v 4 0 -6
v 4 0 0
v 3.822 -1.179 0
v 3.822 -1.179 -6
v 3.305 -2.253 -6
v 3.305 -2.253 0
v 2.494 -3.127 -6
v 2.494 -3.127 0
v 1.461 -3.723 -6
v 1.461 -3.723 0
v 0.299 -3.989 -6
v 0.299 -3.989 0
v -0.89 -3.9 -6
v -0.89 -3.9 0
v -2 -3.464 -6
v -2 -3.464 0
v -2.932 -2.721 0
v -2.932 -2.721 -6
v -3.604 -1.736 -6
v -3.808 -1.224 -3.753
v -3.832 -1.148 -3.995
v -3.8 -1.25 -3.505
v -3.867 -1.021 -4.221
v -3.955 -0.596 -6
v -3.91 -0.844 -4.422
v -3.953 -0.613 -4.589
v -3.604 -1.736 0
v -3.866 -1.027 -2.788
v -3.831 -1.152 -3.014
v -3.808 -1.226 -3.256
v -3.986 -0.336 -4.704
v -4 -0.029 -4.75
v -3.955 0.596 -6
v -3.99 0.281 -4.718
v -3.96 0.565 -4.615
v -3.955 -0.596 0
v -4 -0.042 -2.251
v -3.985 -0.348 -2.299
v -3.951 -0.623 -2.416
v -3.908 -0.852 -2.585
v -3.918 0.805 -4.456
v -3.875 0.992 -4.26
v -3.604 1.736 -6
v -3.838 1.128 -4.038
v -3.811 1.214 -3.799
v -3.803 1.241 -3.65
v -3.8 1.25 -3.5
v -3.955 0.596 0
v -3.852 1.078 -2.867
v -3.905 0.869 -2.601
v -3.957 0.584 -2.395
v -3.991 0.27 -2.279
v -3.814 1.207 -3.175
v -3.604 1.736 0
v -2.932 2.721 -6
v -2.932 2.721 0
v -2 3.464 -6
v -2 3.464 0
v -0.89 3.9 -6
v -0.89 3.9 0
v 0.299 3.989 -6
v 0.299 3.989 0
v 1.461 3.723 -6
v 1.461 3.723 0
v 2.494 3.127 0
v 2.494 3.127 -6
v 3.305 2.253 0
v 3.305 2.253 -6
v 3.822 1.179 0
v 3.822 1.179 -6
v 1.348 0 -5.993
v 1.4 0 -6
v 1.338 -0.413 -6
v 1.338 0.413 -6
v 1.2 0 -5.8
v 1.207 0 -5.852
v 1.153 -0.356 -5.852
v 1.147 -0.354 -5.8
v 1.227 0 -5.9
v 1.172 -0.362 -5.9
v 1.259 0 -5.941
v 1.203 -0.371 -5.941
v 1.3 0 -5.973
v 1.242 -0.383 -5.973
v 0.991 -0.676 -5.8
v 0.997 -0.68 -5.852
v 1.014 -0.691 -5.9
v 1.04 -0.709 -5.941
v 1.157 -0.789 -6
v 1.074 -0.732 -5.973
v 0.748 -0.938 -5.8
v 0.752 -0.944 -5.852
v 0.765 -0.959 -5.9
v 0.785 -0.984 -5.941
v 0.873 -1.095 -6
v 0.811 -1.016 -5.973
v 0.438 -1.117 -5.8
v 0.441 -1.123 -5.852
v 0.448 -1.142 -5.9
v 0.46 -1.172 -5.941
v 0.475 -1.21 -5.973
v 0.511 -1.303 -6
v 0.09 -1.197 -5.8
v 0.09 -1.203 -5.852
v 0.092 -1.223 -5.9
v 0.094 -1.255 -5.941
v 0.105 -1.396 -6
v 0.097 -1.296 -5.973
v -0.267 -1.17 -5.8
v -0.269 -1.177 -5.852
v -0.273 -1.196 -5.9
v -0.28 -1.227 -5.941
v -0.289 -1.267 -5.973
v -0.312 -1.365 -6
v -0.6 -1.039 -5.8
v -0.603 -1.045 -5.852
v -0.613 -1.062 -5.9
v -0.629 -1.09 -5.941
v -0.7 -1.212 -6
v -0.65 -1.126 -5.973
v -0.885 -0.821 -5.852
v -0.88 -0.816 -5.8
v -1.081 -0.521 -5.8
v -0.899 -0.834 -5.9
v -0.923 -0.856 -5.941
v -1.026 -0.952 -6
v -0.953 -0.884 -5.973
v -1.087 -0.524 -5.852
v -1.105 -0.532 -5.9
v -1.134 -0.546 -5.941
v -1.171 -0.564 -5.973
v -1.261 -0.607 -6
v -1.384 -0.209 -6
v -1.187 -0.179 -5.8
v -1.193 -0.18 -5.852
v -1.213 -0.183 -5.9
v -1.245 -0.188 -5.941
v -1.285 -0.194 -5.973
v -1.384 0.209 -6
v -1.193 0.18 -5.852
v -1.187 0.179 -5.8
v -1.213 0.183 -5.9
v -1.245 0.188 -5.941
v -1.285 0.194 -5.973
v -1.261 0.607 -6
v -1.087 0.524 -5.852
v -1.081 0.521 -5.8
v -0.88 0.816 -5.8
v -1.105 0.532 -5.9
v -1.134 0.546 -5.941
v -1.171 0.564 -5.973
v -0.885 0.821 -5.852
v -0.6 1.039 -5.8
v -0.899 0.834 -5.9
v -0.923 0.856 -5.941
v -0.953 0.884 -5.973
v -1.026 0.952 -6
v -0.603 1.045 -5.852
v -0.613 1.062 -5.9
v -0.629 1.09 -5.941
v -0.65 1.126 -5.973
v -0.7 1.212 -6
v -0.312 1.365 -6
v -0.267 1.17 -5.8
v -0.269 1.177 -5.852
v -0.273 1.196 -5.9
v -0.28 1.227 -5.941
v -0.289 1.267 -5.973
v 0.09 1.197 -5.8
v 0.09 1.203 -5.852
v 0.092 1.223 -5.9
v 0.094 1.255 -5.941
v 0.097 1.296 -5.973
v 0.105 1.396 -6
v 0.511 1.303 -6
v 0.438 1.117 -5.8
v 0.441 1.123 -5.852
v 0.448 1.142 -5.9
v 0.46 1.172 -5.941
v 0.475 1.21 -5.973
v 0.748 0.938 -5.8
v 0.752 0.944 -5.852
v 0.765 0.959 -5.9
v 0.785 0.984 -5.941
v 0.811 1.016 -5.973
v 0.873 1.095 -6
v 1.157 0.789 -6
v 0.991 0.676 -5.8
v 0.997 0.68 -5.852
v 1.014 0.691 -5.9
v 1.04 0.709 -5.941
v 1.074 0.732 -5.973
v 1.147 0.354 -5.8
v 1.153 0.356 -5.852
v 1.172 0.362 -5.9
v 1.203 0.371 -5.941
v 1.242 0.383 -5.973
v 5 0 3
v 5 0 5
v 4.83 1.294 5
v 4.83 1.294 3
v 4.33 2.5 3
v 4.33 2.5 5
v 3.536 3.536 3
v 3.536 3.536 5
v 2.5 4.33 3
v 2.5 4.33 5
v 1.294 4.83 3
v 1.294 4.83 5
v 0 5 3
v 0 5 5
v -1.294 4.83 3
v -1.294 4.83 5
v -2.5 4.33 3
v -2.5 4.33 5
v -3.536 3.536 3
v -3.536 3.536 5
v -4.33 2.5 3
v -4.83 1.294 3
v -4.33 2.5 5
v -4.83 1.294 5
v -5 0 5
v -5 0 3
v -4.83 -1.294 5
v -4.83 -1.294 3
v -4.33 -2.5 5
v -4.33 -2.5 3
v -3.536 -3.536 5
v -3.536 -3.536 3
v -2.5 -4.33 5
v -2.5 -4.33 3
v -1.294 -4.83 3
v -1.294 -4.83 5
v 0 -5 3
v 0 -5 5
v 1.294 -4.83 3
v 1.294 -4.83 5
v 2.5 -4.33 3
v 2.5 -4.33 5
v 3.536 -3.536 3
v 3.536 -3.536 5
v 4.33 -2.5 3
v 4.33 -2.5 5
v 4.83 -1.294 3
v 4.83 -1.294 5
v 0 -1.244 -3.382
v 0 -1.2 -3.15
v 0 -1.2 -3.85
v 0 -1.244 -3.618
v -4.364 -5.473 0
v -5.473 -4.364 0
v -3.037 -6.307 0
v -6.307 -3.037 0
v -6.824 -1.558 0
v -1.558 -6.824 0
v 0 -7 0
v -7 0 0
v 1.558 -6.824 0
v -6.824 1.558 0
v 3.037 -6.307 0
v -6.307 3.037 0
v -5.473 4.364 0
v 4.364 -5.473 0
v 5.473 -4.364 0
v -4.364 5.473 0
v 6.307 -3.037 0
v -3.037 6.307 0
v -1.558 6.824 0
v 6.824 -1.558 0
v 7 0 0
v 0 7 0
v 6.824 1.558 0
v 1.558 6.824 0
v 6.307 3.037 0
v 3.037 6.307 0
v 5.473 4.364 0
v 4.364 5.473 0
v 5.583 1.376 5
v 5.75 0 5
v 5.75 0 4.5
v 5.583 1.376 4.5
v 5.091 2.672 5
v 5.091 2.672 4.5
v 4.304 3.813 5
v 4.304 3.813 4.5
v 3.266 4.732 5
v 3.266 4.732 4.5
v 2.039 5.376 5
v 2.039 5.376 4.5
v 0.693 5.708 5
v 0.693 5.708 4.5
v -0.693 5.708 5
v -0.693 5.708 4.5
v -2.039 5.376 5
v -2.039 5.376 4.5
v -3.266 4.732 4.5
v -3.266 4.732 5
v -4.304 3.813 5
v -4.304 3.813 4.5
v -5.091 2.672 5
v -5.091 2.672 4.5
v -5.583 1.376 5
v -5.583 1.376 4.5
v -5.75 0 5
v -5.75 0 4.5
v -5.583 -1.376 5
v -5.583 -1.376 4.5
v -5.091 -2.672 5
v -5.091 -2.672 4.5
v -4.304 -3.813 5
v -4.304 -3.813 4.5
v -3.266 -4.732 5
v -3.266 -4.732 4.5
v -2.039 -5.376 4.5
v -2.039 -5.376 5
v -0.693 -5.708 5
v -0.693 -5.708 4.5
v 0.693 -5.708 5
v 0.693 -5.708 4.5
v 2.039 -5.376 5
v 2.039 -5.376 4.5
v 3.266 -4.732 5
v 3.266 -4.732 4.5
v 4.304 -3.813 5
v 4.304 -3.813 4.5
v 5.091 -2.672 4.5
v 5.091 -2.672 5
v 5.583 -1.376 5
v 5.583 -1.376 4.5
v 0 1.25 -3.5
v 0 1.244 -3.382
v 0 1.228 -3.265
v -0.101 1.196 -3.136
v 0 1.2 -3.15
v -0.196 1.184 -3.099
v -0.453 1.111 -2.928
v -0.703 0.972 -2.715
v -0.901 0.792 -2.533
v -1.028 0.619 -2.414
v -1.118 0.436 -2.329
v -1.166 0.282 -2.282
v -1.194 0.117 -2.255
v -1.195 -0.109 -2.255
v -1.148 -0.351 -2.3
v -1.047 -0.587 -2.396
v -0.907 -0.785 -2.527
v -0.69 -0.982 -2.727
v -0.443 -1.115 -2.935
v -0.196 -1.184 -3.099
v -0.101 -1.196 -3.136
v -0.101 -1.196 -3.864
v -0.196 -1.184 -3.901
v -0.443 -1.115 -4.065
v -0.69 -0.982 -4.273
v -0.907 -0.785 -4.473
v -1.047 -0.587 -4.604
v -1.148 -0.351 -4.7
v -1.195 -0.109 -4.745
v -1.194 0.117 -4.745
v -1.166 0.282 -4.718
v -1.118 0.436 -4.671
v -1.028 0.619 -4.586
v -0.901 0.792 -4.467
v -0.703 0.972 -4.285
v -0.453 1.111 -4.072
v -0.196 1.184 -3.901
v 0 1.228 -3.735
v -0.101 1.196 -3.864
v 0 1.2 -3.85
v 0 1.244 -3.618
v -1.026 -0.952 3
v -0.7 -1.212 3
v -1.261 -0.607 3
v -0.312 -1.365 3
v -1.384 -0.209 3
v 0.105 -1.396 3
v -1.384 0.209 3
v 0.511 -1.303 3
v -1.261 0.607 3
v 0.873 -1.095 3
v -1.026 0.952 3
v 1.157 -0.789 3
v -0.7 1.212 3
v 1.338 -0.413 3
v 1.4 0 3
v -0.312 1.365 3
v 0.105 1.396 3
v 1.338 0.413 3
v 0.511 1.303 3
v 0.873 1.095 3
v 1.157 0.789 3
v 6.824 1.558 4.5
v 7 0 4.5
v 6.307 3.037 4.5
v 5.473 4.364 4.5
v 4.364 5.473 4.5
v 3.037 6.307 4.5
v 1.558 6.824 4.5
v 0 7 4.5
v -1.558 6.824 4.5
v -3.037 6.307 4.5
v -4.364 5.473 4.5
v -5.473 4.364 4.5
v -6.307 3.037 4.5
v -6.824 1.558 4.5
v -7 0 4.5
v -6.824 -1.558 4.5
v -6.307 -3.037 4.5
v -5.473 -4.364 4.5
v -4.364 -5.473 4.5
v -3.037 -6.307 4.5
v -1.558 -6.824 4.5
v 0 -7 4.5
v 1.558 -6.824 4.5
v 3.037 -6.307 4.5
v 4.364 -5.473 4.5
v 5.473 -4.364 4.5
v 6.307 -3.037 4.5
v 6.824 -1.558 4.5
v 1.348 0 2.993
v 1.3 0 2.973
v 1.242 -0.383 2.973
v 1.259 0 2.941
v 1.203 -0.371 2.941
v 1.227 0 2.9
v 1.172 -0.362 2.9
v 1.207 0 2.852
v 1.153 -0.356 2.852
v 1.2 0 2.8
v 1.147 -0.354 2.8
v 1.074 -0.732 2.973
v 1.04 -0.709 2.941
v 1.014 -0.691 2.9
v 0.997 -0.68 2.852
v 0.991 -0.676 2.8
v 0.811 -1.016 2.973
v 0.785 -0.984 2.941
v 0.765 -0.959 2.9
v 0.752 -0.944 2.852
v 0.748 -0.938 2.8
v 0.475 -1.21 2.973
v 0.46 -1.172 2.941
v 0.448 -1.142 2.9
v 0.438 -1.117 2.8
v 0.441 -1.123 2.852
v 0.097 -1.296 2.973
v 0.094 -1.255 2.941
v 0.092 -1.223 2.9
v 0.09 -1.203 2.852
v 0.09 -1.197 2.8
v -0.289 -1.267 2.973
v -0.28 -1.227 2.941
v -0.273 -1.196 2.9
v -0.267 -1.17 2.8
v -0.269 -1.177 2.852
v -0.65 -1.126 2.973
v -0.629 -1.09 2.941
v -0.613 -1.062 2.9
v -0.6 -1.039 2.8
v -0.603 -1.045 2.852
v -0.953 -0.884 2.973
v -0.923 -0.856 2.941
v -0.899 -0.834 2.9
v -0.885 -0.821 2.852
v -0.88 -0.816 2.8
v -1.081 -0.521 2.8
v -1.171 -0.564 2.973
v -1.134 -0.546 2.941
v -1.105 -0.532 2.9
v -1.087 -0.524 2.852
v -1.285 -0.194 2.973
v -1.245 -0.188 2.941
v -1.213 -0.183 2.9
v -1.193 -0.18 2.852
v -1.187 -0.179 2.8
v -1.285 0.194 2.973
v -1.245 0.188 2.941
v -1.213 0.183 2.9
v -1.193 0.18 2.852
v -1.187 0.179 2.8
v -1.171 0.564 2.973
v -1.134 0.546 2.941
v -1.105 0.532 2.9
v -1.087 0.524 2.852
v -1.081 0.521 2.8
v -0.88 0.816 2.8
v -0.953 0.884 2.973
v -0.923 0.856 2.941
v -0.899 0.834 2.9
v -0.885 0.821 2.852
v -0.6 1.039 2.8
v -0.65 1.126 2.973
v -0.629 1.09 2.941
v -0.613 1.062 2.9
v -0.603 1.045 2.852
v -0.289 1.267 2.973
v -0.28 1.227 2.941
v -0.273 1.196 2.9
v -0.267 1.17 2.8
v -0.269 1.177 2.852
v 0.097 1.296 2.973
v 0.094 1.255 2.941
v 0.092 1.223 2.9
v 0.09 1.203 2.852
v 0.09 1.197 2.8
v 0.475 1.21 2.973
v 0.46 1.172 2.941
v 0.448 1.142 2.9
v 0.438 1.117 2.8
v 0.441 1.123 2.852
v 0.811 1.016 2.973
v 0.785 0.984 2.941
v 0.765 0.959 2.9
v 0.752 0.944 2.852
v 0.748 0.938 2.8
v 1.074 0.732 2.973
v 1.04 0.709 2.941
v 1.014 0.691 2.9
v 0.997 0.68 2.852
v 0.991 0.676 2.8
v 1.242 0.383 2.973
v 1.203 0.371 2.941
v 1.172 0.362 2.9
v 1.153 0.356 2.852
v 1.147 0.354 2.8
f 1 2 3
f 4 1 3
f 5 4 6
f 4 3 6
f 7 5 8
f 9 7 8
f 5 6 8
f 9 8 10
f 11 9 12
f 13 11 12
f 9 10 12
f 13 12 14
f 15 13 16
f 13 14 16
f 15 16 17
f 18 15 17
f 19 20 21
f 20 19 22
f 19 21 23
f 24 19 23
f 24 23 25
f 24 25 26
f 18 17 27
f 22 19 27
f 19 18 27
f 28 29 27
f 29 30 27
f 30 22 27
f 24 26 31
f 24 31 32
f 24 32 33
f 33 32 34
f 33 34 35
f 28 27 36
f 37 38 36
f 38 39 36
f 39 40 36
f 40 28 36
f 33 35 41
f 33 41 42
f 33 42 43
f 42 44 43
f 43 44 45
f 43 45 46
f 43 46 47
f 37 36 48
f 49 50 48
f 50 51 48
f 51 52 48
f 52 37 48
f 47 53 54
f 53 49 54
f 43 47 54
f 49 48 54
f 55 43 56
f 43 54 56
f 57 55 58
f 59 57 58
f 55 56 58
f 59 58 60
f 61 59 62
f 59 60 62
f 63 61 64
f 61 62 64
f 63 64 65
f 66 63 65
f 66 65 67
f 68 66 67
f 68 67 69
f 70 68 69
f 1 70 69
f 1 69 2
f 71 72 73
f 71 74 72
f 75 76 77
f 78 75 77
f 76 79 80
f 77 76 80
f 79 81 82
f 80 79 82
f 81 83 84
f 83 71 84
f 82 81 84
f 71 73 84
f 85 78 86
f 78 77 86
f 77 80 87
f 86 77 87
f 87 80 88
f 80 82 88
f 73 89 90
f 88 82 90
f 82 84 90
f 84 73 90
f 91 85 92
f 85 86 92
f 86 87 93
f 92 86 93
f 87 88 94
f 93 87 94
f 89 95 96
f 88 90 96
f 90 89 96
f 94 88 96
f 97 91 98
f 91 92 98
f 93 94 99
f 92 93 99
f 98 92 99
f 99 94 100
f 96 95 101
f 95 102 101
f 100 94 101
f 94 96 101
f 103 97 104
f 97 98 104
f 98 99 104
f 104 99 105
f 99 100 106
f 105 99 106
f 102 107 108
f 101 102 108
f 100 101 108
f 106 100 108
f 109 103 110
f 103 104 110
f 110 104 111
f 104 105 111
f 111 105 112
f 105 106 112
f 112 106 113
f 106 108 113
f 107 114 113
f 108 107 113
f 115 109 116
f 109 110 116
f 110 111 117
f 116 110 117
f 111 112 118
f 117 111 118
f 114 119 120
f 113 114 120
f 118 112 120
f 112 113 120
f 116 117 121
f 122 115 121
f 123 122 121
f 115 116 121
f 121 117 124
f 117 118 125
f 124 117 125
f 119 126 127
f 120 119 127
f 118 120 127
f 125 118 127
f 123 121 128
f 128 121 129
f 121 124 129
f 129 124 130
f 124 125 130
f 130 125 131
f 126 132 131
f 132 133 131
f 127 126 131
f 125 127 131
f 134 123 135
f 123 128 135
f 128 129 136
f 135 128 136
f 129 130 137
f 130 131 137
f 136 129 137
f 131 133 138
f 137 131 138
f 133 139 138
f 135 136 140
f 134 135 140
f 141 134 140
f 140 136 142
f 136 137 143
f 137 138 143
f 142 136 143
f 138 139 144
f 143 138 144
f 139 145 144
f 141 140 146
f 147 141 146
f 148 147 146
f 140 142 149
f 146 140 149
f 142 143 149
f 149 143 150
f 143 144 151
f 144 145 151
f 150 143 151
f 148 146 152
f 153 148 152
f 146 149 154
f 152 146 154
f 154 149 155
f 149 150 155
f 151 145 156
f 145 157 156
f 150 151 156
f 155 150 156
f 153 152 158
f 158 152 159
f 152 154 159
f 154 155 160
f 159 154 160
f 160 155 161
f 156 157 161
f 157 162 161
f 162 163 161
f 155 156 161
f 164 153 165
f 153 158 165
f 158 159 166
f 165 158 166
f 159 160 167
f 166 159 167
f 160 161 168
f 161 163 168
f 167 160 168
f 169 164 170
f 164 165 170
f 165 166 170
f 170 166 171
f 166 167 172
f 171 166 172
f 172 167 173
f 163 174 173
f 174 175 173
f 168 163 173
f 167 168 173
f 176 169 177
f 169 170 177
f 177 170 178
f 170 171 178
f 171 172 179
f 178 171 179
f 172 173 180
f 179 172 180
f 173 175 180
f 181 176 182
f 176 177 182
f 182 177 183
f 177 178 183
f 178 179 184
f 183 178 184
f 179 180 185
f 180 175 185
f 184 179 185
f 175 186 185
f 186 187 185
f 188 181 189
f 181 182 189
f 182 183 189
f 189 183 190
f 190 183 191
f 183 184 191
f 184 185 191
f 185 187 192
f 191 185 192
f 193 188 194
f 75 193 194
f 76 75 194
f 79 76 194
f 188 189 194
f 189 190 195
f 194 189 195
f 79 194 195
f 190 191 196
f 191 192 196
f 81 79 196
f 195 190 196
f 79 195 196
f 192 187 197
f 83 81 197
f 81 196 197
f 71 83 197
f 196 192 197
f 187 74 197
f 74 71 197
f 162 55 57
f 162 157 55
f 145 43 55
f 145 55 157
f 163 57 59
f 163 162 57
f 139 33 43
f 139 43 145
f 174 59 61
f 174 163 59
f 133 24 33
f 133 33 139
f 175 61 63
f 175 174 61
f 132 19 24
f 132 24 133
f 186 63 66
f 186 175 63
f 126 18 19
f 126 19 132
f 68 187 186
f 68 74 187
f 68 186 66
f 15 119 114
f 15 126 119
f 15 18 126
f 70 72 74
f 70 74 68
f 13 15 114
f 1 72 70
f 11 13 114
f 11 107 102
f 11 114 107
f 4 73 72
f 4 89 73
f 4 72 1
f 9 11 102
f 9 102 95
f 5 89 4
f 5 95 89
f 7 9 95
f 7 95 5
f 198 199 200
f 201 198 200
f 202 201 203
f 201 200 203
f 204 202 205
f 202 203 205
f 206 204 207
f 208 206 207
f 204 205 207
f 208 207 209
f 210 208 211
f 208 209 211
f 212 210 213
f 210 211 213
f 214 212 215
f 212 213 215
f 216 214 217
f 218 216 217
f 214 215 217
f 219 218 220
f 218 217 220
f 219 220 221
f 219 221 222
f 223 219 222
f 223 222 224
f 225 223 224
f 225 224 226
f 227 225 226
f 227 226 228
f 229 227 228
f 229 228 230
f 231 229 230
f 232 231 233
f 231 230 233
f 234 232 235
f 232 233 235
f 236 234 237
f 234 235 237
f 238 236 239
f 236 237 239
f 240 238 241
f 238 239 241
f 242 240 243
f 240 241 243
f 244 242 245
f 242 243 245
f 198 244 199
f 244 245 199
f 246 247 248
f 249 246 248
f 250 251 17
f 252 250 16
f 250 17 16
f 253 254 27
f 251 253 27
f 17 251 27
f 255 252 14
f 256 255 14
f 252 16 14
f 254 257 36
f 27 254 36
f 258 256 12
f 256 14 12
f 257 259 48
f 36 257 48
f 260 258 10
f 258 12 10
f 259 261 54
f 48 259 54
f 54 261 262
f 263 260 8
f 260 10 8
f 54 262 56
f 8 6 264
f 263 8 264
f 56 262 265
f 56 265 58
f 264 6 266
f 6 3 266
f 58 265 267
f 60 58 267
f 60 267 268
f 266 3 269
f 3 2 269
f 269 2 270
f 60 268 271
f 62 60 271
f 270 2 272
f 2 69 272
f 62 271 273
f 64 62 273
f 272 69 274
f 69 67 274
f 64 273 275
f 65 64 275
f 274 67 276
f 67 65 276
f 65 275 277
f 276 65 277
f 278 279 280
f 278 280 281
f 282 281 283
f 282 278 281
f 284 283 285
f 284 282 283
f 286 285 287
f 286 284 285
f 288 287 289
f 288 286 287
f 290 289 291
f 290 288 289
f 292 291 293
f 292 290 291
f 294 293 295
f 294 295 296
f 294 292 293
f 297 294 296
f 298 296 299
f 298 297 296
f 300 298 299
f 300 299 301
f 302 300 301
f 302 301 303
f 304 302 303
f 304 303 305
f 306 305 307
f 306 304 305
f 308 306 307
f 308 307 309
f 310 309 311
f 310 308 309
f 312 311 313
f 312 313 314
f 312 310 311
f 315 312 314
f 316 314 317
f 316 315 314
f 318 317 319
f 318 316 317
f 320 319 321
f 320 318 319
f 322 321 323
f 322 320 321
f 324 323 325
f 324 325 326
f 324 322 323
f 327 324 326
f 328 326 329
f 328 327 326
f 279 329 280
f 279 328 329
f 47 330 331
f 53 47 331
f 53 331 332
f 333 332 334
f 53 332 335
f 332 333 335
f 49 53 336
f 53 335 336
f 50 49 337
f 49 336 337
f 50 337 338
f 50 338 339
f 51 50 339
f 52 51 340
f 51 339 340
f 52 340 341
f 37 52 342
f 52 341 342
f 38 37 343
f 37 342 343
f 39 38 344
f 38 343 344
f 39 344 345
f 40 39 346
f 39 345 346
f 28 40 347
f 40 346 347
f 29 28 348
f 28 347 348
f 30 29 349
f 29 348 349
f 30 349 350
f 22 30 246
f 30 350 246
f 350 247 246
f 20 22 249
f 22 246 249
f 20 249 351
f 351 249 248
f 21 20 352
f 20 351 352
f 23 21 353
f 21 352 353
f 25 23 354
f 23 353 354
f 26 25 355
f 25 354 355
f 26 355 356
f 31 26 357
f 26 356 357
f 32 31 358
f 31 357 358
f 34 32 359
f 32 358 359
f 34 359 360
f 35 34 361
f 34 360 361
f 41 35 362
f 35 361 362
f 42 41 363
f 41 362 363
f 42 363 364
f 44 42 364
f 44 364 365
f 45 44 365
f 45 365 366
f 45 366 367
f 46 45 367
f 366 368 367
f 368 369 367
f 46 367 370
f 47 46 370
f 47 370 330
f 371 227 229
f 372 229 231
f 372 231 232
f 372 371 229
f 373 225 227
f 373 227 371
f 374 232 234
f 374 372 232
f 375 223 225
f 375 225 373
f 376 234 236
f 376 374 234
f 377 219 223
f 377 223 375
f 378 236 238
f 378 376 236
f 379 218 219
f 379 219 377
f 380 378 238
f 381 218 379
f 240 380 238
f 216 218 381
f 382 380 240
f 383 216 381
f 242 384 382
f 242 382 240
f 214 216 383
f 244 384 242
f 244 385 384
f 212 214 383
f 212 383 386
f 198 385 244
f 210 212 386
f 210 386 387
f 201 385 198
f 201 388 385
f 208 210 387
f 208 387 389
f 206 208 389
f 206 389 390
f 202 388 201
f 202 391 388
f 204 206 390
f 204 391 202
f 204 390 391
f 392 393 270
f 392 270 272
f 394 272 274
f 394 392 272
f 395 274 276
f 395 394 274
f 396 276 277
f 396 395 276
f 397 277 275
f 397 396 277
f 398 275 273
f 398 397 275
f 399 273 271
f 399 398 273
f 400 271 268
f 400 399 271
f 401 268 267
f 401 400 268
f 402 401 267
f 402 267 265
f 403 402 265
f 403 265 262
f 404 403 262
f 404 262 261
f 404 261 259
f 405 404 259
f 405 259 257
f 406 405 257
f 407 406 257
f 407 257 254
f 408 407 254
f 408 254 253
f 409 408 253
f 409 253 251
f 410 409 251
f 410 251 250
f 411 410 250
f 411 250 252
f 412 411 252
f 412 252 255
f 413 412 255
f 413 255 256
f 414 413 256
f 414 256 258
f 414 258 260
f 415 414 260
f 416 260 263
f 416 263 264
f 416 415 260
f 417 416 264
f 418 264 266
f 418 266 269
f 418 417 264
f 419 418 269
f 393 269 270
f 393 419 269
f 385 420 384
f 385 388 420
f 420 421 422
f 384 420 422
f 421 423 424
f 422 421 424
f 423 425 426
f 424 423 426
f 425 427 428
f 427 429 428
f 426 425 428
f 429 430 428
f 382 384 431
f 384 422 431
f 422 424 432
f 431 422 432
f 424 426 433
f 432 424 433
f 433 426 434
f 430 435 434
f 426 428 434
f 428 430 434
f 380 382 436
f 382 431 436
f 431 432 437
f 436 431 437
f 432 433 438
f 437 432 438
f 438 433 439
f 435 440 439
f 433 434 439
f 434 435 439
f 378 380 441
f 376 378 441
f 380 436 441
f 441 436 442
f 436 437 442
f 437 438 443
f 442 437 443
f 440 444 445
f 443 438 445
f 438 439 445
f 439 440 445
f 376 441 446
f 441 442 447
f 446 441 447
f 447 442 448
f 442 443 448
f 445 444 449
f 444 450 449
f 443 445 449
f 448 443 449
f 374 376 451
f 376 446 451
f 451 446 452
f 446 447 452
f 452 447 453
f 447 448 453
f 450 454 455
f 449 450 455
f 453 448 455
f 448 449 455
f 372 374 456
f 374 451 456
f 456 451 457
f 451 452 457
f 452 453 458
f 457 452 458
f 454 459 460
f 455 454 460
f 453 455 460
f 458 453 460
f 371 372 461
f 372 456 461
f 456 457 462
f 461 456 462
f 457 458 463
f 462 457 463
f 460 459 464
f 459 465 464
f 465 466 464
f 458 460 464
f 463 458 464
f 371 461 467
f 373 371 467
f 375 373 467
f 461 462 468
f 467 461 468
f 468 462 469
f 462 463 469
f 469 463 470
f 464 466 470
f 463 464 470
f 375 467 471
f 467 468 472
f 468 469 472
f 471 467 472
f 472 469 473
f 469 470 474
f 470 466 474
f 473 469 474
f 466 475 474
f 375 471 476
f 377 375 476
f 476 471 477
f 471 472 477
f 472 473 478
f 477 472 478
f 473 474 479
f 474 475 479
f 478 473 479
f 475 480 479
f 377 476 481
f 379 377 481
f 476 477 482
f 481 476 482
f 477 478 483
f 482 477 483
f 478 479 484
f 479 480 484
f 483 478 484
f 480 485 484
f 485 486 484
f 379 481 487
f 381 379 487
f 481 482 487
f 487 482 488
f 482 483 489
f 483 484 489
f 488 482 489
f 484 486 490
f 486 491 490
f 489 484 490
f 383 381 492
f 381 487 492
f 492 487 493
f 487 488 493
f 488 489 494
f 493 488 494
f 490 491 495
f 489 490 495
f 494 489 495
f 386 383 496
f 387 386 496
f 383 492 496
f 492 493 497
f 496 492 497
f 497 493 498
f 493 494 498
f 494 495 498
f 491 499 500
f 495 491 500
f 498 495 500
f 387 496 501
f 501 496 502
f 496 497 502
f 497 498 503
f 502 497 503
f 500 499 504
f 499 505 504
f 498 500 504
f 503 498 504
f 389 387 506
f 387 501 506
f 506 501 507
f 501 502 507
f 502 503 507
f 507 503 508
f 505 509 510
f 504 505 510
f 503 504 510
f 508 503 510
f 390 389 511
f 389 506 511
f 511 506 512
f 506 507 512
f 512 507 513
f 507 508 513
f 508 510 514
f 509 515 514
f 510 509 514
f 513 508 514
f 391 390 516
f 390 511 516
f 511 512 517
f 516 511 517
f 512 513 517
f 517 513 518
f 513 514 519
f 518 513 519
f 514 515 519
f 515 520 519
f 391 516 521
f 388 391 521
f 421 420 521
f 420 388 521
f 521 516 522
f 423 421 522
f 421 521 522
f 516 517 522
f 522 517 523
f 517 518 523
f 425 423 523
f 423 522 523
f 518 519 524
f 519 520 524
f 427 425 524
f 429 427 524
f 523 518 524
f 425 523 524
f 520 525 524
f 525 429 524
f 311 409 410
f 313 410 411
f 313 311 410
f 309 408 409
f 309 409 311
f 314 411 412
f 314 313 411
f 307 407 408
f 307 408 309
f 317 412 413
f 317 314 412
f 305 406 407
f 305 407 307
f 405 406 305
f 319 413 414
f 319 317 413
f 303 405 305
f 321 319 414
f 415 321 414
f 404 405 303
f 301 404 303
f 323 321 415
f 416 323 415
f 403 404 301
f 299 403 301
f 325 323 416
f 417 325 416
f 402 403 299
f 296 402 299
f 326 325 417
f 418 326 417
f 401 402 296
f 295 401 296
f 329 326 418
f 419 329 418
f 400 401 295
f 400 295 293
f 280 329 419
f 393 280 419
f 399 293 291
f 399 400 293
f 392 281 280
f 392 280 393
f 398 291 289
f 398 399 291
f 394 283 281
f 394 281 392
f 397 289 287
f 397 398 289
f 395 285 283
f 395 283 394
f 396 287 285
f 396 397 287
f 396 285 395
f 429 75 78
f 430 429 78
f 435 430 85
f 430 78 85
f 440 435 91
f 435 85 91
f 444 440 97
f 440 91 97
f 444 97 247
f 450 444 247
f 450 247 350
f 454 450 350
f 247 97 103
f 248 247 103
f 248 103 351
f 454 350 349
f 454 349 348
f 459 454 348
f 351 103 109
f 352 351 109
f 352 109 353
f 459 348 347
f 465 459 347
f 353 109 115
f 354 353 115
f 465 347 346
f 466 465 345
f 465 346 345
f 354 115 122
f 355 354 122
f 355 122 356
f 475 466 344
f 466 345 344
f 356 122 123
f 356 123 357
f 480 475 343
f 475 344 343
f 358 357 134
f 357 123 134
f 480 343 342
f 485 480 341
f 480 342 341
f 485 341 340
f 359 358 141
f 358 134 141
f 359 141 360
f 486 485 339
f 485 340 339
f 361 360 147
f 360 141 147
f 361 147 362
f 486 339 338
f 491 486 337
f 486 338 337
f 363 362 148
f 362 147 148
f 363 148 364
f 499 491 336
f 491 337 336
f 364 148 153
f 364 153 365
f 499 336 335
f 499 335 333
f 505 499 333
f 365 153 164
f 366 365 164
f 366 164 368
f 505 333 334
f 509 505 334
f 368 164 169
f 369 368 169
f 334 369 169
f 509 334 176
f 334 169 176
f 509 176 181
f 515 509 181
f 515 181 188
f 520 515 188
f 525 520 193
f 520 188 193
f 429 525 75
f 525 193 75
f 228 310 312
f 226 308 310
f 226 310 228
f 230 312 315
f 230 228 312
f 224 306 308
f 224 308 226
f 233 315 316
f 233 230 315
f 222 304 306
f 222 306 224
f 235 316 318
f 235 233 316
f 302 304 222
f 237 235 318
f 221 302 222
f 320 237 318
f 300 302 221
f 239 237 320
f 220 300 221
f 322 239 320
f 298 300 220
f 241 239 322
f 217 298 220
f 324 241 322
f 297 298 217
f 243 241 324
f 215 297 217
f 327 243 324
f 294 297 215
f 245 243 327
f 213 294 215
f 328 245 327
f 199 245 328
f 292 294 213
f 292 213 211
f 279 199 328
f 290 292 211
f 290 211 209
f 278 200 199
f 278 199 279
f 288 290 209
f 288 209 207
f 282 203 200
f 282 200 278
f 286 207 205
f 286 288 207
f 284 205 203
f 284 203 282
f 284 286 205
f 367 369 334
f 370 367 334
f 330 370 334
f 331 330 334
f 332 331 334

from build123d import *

# Parameters (mm, degrees)
F0_R      = 8
F1_DEPTH  = 5
F2_R      = 4
F3_DEPTH  = 6
F4_R      = 1.2
F5_DEPTH  = 9
F6_R      = 5
F7_DEPTH  = 2
F8_R      = 7.5
F8_R_2    = 6.75
F9_DEPTH  = 0.5
F10_SIZE  = 0.2
F11_R     = 0.2
F13_R     = 1.25
F14_DEPTH = 4.5
F15_R     = 8
F15_R_2   = 7
F16_DEPTH = 10
F17_R     = 7
F17_R_2   = 5.75
F18_DEPTH = 0.5


with BuildPart() as f1:
    # F0 (on Top) → F1 (new body)
    with BuildSketch(Plane.XY):
        Circle(F0_R)
    extrude(amount=F1_DEPTH)

    # F2 (on face) → F3 (join)
    with BuildSketch(Plane(origin=(0, 0, 0), x_dir=(1, 0, 0), z_dir=(0, 0, -1))):
        Circle(F2_R)
    extrude(amount=F3_DEPTH)

    # F4 (on face) → F5 (cut)
    with BuildSketch(Plane(origin=(0, 0, -6), x_dir=(1, 0, 0), z_dir=(0, 0, -1))):
        Circle(F4_R)
    extrude(amount=-F5_DEPTH, mode=Mode.SUBTRACT)

    # F6 (on face) → F7 (cut)
    with BuildSketch(Plane.XY.offset(5)):
        Circle(F6_R)
    extrude(amount=-F7_DEPTH, mode=Mode.SUBTRACT)

    # F8 (on face) → F9 (cut)
    with BuildSketch(Plane.XY.offset(5)):
        Circle(F8_R)
        Circle(F8_R_2, mode=Mode.SUBTRACT)
    extrude(amount=-F9_DEPTH, mode=Mode.SUBTRACT)

    # F10
    f10_edges = [f1.edges().sort_by_distance(p)[0] for p in [
        (-6.75, 0, 5),
    ]]
    chamfer(f10_edges, length=F10_SIZE)

    # F11
    f11_edges = [f1.edges().sort_by_distance(p)[0] for p in [
        (-6.75, 0, 4.8),
        (-1.2, 0, 3),
        (-1.2, 0, -6),
    ]]
    fillet(f11_edges, radius=F11_R)

    # F13 (on Right) → F14 (cut)
    with BuildSketch(Plane.YZ):
        with Locations((0, -3.5)):
            Circle(F13_R)
    extrude(amount=-F14_DEPTH, mode=Mode.SUBTRACT)

    # F15 (on face) → F16 (cut)
    with BuildSketch(Plane.XY.offset(5)):
        Circle(F15_R)
        Circle(F15_R_2, mode=Mode.SUBTRACT)
    extrude(amount=-F16_DEPTH, mode=Mode.SUBTRACT)

    # F17 (on face) → F18 (cut)
    with BuildSketch(Plane.XY.offset(5)):
        Circle(F17_R)
        Circle(F17_R_2, mode=Mode.SUBTRACT)
    extrude(amount=-F18_DEPTH, mode=Mode.SUBTRACT)


solid = f1.part
